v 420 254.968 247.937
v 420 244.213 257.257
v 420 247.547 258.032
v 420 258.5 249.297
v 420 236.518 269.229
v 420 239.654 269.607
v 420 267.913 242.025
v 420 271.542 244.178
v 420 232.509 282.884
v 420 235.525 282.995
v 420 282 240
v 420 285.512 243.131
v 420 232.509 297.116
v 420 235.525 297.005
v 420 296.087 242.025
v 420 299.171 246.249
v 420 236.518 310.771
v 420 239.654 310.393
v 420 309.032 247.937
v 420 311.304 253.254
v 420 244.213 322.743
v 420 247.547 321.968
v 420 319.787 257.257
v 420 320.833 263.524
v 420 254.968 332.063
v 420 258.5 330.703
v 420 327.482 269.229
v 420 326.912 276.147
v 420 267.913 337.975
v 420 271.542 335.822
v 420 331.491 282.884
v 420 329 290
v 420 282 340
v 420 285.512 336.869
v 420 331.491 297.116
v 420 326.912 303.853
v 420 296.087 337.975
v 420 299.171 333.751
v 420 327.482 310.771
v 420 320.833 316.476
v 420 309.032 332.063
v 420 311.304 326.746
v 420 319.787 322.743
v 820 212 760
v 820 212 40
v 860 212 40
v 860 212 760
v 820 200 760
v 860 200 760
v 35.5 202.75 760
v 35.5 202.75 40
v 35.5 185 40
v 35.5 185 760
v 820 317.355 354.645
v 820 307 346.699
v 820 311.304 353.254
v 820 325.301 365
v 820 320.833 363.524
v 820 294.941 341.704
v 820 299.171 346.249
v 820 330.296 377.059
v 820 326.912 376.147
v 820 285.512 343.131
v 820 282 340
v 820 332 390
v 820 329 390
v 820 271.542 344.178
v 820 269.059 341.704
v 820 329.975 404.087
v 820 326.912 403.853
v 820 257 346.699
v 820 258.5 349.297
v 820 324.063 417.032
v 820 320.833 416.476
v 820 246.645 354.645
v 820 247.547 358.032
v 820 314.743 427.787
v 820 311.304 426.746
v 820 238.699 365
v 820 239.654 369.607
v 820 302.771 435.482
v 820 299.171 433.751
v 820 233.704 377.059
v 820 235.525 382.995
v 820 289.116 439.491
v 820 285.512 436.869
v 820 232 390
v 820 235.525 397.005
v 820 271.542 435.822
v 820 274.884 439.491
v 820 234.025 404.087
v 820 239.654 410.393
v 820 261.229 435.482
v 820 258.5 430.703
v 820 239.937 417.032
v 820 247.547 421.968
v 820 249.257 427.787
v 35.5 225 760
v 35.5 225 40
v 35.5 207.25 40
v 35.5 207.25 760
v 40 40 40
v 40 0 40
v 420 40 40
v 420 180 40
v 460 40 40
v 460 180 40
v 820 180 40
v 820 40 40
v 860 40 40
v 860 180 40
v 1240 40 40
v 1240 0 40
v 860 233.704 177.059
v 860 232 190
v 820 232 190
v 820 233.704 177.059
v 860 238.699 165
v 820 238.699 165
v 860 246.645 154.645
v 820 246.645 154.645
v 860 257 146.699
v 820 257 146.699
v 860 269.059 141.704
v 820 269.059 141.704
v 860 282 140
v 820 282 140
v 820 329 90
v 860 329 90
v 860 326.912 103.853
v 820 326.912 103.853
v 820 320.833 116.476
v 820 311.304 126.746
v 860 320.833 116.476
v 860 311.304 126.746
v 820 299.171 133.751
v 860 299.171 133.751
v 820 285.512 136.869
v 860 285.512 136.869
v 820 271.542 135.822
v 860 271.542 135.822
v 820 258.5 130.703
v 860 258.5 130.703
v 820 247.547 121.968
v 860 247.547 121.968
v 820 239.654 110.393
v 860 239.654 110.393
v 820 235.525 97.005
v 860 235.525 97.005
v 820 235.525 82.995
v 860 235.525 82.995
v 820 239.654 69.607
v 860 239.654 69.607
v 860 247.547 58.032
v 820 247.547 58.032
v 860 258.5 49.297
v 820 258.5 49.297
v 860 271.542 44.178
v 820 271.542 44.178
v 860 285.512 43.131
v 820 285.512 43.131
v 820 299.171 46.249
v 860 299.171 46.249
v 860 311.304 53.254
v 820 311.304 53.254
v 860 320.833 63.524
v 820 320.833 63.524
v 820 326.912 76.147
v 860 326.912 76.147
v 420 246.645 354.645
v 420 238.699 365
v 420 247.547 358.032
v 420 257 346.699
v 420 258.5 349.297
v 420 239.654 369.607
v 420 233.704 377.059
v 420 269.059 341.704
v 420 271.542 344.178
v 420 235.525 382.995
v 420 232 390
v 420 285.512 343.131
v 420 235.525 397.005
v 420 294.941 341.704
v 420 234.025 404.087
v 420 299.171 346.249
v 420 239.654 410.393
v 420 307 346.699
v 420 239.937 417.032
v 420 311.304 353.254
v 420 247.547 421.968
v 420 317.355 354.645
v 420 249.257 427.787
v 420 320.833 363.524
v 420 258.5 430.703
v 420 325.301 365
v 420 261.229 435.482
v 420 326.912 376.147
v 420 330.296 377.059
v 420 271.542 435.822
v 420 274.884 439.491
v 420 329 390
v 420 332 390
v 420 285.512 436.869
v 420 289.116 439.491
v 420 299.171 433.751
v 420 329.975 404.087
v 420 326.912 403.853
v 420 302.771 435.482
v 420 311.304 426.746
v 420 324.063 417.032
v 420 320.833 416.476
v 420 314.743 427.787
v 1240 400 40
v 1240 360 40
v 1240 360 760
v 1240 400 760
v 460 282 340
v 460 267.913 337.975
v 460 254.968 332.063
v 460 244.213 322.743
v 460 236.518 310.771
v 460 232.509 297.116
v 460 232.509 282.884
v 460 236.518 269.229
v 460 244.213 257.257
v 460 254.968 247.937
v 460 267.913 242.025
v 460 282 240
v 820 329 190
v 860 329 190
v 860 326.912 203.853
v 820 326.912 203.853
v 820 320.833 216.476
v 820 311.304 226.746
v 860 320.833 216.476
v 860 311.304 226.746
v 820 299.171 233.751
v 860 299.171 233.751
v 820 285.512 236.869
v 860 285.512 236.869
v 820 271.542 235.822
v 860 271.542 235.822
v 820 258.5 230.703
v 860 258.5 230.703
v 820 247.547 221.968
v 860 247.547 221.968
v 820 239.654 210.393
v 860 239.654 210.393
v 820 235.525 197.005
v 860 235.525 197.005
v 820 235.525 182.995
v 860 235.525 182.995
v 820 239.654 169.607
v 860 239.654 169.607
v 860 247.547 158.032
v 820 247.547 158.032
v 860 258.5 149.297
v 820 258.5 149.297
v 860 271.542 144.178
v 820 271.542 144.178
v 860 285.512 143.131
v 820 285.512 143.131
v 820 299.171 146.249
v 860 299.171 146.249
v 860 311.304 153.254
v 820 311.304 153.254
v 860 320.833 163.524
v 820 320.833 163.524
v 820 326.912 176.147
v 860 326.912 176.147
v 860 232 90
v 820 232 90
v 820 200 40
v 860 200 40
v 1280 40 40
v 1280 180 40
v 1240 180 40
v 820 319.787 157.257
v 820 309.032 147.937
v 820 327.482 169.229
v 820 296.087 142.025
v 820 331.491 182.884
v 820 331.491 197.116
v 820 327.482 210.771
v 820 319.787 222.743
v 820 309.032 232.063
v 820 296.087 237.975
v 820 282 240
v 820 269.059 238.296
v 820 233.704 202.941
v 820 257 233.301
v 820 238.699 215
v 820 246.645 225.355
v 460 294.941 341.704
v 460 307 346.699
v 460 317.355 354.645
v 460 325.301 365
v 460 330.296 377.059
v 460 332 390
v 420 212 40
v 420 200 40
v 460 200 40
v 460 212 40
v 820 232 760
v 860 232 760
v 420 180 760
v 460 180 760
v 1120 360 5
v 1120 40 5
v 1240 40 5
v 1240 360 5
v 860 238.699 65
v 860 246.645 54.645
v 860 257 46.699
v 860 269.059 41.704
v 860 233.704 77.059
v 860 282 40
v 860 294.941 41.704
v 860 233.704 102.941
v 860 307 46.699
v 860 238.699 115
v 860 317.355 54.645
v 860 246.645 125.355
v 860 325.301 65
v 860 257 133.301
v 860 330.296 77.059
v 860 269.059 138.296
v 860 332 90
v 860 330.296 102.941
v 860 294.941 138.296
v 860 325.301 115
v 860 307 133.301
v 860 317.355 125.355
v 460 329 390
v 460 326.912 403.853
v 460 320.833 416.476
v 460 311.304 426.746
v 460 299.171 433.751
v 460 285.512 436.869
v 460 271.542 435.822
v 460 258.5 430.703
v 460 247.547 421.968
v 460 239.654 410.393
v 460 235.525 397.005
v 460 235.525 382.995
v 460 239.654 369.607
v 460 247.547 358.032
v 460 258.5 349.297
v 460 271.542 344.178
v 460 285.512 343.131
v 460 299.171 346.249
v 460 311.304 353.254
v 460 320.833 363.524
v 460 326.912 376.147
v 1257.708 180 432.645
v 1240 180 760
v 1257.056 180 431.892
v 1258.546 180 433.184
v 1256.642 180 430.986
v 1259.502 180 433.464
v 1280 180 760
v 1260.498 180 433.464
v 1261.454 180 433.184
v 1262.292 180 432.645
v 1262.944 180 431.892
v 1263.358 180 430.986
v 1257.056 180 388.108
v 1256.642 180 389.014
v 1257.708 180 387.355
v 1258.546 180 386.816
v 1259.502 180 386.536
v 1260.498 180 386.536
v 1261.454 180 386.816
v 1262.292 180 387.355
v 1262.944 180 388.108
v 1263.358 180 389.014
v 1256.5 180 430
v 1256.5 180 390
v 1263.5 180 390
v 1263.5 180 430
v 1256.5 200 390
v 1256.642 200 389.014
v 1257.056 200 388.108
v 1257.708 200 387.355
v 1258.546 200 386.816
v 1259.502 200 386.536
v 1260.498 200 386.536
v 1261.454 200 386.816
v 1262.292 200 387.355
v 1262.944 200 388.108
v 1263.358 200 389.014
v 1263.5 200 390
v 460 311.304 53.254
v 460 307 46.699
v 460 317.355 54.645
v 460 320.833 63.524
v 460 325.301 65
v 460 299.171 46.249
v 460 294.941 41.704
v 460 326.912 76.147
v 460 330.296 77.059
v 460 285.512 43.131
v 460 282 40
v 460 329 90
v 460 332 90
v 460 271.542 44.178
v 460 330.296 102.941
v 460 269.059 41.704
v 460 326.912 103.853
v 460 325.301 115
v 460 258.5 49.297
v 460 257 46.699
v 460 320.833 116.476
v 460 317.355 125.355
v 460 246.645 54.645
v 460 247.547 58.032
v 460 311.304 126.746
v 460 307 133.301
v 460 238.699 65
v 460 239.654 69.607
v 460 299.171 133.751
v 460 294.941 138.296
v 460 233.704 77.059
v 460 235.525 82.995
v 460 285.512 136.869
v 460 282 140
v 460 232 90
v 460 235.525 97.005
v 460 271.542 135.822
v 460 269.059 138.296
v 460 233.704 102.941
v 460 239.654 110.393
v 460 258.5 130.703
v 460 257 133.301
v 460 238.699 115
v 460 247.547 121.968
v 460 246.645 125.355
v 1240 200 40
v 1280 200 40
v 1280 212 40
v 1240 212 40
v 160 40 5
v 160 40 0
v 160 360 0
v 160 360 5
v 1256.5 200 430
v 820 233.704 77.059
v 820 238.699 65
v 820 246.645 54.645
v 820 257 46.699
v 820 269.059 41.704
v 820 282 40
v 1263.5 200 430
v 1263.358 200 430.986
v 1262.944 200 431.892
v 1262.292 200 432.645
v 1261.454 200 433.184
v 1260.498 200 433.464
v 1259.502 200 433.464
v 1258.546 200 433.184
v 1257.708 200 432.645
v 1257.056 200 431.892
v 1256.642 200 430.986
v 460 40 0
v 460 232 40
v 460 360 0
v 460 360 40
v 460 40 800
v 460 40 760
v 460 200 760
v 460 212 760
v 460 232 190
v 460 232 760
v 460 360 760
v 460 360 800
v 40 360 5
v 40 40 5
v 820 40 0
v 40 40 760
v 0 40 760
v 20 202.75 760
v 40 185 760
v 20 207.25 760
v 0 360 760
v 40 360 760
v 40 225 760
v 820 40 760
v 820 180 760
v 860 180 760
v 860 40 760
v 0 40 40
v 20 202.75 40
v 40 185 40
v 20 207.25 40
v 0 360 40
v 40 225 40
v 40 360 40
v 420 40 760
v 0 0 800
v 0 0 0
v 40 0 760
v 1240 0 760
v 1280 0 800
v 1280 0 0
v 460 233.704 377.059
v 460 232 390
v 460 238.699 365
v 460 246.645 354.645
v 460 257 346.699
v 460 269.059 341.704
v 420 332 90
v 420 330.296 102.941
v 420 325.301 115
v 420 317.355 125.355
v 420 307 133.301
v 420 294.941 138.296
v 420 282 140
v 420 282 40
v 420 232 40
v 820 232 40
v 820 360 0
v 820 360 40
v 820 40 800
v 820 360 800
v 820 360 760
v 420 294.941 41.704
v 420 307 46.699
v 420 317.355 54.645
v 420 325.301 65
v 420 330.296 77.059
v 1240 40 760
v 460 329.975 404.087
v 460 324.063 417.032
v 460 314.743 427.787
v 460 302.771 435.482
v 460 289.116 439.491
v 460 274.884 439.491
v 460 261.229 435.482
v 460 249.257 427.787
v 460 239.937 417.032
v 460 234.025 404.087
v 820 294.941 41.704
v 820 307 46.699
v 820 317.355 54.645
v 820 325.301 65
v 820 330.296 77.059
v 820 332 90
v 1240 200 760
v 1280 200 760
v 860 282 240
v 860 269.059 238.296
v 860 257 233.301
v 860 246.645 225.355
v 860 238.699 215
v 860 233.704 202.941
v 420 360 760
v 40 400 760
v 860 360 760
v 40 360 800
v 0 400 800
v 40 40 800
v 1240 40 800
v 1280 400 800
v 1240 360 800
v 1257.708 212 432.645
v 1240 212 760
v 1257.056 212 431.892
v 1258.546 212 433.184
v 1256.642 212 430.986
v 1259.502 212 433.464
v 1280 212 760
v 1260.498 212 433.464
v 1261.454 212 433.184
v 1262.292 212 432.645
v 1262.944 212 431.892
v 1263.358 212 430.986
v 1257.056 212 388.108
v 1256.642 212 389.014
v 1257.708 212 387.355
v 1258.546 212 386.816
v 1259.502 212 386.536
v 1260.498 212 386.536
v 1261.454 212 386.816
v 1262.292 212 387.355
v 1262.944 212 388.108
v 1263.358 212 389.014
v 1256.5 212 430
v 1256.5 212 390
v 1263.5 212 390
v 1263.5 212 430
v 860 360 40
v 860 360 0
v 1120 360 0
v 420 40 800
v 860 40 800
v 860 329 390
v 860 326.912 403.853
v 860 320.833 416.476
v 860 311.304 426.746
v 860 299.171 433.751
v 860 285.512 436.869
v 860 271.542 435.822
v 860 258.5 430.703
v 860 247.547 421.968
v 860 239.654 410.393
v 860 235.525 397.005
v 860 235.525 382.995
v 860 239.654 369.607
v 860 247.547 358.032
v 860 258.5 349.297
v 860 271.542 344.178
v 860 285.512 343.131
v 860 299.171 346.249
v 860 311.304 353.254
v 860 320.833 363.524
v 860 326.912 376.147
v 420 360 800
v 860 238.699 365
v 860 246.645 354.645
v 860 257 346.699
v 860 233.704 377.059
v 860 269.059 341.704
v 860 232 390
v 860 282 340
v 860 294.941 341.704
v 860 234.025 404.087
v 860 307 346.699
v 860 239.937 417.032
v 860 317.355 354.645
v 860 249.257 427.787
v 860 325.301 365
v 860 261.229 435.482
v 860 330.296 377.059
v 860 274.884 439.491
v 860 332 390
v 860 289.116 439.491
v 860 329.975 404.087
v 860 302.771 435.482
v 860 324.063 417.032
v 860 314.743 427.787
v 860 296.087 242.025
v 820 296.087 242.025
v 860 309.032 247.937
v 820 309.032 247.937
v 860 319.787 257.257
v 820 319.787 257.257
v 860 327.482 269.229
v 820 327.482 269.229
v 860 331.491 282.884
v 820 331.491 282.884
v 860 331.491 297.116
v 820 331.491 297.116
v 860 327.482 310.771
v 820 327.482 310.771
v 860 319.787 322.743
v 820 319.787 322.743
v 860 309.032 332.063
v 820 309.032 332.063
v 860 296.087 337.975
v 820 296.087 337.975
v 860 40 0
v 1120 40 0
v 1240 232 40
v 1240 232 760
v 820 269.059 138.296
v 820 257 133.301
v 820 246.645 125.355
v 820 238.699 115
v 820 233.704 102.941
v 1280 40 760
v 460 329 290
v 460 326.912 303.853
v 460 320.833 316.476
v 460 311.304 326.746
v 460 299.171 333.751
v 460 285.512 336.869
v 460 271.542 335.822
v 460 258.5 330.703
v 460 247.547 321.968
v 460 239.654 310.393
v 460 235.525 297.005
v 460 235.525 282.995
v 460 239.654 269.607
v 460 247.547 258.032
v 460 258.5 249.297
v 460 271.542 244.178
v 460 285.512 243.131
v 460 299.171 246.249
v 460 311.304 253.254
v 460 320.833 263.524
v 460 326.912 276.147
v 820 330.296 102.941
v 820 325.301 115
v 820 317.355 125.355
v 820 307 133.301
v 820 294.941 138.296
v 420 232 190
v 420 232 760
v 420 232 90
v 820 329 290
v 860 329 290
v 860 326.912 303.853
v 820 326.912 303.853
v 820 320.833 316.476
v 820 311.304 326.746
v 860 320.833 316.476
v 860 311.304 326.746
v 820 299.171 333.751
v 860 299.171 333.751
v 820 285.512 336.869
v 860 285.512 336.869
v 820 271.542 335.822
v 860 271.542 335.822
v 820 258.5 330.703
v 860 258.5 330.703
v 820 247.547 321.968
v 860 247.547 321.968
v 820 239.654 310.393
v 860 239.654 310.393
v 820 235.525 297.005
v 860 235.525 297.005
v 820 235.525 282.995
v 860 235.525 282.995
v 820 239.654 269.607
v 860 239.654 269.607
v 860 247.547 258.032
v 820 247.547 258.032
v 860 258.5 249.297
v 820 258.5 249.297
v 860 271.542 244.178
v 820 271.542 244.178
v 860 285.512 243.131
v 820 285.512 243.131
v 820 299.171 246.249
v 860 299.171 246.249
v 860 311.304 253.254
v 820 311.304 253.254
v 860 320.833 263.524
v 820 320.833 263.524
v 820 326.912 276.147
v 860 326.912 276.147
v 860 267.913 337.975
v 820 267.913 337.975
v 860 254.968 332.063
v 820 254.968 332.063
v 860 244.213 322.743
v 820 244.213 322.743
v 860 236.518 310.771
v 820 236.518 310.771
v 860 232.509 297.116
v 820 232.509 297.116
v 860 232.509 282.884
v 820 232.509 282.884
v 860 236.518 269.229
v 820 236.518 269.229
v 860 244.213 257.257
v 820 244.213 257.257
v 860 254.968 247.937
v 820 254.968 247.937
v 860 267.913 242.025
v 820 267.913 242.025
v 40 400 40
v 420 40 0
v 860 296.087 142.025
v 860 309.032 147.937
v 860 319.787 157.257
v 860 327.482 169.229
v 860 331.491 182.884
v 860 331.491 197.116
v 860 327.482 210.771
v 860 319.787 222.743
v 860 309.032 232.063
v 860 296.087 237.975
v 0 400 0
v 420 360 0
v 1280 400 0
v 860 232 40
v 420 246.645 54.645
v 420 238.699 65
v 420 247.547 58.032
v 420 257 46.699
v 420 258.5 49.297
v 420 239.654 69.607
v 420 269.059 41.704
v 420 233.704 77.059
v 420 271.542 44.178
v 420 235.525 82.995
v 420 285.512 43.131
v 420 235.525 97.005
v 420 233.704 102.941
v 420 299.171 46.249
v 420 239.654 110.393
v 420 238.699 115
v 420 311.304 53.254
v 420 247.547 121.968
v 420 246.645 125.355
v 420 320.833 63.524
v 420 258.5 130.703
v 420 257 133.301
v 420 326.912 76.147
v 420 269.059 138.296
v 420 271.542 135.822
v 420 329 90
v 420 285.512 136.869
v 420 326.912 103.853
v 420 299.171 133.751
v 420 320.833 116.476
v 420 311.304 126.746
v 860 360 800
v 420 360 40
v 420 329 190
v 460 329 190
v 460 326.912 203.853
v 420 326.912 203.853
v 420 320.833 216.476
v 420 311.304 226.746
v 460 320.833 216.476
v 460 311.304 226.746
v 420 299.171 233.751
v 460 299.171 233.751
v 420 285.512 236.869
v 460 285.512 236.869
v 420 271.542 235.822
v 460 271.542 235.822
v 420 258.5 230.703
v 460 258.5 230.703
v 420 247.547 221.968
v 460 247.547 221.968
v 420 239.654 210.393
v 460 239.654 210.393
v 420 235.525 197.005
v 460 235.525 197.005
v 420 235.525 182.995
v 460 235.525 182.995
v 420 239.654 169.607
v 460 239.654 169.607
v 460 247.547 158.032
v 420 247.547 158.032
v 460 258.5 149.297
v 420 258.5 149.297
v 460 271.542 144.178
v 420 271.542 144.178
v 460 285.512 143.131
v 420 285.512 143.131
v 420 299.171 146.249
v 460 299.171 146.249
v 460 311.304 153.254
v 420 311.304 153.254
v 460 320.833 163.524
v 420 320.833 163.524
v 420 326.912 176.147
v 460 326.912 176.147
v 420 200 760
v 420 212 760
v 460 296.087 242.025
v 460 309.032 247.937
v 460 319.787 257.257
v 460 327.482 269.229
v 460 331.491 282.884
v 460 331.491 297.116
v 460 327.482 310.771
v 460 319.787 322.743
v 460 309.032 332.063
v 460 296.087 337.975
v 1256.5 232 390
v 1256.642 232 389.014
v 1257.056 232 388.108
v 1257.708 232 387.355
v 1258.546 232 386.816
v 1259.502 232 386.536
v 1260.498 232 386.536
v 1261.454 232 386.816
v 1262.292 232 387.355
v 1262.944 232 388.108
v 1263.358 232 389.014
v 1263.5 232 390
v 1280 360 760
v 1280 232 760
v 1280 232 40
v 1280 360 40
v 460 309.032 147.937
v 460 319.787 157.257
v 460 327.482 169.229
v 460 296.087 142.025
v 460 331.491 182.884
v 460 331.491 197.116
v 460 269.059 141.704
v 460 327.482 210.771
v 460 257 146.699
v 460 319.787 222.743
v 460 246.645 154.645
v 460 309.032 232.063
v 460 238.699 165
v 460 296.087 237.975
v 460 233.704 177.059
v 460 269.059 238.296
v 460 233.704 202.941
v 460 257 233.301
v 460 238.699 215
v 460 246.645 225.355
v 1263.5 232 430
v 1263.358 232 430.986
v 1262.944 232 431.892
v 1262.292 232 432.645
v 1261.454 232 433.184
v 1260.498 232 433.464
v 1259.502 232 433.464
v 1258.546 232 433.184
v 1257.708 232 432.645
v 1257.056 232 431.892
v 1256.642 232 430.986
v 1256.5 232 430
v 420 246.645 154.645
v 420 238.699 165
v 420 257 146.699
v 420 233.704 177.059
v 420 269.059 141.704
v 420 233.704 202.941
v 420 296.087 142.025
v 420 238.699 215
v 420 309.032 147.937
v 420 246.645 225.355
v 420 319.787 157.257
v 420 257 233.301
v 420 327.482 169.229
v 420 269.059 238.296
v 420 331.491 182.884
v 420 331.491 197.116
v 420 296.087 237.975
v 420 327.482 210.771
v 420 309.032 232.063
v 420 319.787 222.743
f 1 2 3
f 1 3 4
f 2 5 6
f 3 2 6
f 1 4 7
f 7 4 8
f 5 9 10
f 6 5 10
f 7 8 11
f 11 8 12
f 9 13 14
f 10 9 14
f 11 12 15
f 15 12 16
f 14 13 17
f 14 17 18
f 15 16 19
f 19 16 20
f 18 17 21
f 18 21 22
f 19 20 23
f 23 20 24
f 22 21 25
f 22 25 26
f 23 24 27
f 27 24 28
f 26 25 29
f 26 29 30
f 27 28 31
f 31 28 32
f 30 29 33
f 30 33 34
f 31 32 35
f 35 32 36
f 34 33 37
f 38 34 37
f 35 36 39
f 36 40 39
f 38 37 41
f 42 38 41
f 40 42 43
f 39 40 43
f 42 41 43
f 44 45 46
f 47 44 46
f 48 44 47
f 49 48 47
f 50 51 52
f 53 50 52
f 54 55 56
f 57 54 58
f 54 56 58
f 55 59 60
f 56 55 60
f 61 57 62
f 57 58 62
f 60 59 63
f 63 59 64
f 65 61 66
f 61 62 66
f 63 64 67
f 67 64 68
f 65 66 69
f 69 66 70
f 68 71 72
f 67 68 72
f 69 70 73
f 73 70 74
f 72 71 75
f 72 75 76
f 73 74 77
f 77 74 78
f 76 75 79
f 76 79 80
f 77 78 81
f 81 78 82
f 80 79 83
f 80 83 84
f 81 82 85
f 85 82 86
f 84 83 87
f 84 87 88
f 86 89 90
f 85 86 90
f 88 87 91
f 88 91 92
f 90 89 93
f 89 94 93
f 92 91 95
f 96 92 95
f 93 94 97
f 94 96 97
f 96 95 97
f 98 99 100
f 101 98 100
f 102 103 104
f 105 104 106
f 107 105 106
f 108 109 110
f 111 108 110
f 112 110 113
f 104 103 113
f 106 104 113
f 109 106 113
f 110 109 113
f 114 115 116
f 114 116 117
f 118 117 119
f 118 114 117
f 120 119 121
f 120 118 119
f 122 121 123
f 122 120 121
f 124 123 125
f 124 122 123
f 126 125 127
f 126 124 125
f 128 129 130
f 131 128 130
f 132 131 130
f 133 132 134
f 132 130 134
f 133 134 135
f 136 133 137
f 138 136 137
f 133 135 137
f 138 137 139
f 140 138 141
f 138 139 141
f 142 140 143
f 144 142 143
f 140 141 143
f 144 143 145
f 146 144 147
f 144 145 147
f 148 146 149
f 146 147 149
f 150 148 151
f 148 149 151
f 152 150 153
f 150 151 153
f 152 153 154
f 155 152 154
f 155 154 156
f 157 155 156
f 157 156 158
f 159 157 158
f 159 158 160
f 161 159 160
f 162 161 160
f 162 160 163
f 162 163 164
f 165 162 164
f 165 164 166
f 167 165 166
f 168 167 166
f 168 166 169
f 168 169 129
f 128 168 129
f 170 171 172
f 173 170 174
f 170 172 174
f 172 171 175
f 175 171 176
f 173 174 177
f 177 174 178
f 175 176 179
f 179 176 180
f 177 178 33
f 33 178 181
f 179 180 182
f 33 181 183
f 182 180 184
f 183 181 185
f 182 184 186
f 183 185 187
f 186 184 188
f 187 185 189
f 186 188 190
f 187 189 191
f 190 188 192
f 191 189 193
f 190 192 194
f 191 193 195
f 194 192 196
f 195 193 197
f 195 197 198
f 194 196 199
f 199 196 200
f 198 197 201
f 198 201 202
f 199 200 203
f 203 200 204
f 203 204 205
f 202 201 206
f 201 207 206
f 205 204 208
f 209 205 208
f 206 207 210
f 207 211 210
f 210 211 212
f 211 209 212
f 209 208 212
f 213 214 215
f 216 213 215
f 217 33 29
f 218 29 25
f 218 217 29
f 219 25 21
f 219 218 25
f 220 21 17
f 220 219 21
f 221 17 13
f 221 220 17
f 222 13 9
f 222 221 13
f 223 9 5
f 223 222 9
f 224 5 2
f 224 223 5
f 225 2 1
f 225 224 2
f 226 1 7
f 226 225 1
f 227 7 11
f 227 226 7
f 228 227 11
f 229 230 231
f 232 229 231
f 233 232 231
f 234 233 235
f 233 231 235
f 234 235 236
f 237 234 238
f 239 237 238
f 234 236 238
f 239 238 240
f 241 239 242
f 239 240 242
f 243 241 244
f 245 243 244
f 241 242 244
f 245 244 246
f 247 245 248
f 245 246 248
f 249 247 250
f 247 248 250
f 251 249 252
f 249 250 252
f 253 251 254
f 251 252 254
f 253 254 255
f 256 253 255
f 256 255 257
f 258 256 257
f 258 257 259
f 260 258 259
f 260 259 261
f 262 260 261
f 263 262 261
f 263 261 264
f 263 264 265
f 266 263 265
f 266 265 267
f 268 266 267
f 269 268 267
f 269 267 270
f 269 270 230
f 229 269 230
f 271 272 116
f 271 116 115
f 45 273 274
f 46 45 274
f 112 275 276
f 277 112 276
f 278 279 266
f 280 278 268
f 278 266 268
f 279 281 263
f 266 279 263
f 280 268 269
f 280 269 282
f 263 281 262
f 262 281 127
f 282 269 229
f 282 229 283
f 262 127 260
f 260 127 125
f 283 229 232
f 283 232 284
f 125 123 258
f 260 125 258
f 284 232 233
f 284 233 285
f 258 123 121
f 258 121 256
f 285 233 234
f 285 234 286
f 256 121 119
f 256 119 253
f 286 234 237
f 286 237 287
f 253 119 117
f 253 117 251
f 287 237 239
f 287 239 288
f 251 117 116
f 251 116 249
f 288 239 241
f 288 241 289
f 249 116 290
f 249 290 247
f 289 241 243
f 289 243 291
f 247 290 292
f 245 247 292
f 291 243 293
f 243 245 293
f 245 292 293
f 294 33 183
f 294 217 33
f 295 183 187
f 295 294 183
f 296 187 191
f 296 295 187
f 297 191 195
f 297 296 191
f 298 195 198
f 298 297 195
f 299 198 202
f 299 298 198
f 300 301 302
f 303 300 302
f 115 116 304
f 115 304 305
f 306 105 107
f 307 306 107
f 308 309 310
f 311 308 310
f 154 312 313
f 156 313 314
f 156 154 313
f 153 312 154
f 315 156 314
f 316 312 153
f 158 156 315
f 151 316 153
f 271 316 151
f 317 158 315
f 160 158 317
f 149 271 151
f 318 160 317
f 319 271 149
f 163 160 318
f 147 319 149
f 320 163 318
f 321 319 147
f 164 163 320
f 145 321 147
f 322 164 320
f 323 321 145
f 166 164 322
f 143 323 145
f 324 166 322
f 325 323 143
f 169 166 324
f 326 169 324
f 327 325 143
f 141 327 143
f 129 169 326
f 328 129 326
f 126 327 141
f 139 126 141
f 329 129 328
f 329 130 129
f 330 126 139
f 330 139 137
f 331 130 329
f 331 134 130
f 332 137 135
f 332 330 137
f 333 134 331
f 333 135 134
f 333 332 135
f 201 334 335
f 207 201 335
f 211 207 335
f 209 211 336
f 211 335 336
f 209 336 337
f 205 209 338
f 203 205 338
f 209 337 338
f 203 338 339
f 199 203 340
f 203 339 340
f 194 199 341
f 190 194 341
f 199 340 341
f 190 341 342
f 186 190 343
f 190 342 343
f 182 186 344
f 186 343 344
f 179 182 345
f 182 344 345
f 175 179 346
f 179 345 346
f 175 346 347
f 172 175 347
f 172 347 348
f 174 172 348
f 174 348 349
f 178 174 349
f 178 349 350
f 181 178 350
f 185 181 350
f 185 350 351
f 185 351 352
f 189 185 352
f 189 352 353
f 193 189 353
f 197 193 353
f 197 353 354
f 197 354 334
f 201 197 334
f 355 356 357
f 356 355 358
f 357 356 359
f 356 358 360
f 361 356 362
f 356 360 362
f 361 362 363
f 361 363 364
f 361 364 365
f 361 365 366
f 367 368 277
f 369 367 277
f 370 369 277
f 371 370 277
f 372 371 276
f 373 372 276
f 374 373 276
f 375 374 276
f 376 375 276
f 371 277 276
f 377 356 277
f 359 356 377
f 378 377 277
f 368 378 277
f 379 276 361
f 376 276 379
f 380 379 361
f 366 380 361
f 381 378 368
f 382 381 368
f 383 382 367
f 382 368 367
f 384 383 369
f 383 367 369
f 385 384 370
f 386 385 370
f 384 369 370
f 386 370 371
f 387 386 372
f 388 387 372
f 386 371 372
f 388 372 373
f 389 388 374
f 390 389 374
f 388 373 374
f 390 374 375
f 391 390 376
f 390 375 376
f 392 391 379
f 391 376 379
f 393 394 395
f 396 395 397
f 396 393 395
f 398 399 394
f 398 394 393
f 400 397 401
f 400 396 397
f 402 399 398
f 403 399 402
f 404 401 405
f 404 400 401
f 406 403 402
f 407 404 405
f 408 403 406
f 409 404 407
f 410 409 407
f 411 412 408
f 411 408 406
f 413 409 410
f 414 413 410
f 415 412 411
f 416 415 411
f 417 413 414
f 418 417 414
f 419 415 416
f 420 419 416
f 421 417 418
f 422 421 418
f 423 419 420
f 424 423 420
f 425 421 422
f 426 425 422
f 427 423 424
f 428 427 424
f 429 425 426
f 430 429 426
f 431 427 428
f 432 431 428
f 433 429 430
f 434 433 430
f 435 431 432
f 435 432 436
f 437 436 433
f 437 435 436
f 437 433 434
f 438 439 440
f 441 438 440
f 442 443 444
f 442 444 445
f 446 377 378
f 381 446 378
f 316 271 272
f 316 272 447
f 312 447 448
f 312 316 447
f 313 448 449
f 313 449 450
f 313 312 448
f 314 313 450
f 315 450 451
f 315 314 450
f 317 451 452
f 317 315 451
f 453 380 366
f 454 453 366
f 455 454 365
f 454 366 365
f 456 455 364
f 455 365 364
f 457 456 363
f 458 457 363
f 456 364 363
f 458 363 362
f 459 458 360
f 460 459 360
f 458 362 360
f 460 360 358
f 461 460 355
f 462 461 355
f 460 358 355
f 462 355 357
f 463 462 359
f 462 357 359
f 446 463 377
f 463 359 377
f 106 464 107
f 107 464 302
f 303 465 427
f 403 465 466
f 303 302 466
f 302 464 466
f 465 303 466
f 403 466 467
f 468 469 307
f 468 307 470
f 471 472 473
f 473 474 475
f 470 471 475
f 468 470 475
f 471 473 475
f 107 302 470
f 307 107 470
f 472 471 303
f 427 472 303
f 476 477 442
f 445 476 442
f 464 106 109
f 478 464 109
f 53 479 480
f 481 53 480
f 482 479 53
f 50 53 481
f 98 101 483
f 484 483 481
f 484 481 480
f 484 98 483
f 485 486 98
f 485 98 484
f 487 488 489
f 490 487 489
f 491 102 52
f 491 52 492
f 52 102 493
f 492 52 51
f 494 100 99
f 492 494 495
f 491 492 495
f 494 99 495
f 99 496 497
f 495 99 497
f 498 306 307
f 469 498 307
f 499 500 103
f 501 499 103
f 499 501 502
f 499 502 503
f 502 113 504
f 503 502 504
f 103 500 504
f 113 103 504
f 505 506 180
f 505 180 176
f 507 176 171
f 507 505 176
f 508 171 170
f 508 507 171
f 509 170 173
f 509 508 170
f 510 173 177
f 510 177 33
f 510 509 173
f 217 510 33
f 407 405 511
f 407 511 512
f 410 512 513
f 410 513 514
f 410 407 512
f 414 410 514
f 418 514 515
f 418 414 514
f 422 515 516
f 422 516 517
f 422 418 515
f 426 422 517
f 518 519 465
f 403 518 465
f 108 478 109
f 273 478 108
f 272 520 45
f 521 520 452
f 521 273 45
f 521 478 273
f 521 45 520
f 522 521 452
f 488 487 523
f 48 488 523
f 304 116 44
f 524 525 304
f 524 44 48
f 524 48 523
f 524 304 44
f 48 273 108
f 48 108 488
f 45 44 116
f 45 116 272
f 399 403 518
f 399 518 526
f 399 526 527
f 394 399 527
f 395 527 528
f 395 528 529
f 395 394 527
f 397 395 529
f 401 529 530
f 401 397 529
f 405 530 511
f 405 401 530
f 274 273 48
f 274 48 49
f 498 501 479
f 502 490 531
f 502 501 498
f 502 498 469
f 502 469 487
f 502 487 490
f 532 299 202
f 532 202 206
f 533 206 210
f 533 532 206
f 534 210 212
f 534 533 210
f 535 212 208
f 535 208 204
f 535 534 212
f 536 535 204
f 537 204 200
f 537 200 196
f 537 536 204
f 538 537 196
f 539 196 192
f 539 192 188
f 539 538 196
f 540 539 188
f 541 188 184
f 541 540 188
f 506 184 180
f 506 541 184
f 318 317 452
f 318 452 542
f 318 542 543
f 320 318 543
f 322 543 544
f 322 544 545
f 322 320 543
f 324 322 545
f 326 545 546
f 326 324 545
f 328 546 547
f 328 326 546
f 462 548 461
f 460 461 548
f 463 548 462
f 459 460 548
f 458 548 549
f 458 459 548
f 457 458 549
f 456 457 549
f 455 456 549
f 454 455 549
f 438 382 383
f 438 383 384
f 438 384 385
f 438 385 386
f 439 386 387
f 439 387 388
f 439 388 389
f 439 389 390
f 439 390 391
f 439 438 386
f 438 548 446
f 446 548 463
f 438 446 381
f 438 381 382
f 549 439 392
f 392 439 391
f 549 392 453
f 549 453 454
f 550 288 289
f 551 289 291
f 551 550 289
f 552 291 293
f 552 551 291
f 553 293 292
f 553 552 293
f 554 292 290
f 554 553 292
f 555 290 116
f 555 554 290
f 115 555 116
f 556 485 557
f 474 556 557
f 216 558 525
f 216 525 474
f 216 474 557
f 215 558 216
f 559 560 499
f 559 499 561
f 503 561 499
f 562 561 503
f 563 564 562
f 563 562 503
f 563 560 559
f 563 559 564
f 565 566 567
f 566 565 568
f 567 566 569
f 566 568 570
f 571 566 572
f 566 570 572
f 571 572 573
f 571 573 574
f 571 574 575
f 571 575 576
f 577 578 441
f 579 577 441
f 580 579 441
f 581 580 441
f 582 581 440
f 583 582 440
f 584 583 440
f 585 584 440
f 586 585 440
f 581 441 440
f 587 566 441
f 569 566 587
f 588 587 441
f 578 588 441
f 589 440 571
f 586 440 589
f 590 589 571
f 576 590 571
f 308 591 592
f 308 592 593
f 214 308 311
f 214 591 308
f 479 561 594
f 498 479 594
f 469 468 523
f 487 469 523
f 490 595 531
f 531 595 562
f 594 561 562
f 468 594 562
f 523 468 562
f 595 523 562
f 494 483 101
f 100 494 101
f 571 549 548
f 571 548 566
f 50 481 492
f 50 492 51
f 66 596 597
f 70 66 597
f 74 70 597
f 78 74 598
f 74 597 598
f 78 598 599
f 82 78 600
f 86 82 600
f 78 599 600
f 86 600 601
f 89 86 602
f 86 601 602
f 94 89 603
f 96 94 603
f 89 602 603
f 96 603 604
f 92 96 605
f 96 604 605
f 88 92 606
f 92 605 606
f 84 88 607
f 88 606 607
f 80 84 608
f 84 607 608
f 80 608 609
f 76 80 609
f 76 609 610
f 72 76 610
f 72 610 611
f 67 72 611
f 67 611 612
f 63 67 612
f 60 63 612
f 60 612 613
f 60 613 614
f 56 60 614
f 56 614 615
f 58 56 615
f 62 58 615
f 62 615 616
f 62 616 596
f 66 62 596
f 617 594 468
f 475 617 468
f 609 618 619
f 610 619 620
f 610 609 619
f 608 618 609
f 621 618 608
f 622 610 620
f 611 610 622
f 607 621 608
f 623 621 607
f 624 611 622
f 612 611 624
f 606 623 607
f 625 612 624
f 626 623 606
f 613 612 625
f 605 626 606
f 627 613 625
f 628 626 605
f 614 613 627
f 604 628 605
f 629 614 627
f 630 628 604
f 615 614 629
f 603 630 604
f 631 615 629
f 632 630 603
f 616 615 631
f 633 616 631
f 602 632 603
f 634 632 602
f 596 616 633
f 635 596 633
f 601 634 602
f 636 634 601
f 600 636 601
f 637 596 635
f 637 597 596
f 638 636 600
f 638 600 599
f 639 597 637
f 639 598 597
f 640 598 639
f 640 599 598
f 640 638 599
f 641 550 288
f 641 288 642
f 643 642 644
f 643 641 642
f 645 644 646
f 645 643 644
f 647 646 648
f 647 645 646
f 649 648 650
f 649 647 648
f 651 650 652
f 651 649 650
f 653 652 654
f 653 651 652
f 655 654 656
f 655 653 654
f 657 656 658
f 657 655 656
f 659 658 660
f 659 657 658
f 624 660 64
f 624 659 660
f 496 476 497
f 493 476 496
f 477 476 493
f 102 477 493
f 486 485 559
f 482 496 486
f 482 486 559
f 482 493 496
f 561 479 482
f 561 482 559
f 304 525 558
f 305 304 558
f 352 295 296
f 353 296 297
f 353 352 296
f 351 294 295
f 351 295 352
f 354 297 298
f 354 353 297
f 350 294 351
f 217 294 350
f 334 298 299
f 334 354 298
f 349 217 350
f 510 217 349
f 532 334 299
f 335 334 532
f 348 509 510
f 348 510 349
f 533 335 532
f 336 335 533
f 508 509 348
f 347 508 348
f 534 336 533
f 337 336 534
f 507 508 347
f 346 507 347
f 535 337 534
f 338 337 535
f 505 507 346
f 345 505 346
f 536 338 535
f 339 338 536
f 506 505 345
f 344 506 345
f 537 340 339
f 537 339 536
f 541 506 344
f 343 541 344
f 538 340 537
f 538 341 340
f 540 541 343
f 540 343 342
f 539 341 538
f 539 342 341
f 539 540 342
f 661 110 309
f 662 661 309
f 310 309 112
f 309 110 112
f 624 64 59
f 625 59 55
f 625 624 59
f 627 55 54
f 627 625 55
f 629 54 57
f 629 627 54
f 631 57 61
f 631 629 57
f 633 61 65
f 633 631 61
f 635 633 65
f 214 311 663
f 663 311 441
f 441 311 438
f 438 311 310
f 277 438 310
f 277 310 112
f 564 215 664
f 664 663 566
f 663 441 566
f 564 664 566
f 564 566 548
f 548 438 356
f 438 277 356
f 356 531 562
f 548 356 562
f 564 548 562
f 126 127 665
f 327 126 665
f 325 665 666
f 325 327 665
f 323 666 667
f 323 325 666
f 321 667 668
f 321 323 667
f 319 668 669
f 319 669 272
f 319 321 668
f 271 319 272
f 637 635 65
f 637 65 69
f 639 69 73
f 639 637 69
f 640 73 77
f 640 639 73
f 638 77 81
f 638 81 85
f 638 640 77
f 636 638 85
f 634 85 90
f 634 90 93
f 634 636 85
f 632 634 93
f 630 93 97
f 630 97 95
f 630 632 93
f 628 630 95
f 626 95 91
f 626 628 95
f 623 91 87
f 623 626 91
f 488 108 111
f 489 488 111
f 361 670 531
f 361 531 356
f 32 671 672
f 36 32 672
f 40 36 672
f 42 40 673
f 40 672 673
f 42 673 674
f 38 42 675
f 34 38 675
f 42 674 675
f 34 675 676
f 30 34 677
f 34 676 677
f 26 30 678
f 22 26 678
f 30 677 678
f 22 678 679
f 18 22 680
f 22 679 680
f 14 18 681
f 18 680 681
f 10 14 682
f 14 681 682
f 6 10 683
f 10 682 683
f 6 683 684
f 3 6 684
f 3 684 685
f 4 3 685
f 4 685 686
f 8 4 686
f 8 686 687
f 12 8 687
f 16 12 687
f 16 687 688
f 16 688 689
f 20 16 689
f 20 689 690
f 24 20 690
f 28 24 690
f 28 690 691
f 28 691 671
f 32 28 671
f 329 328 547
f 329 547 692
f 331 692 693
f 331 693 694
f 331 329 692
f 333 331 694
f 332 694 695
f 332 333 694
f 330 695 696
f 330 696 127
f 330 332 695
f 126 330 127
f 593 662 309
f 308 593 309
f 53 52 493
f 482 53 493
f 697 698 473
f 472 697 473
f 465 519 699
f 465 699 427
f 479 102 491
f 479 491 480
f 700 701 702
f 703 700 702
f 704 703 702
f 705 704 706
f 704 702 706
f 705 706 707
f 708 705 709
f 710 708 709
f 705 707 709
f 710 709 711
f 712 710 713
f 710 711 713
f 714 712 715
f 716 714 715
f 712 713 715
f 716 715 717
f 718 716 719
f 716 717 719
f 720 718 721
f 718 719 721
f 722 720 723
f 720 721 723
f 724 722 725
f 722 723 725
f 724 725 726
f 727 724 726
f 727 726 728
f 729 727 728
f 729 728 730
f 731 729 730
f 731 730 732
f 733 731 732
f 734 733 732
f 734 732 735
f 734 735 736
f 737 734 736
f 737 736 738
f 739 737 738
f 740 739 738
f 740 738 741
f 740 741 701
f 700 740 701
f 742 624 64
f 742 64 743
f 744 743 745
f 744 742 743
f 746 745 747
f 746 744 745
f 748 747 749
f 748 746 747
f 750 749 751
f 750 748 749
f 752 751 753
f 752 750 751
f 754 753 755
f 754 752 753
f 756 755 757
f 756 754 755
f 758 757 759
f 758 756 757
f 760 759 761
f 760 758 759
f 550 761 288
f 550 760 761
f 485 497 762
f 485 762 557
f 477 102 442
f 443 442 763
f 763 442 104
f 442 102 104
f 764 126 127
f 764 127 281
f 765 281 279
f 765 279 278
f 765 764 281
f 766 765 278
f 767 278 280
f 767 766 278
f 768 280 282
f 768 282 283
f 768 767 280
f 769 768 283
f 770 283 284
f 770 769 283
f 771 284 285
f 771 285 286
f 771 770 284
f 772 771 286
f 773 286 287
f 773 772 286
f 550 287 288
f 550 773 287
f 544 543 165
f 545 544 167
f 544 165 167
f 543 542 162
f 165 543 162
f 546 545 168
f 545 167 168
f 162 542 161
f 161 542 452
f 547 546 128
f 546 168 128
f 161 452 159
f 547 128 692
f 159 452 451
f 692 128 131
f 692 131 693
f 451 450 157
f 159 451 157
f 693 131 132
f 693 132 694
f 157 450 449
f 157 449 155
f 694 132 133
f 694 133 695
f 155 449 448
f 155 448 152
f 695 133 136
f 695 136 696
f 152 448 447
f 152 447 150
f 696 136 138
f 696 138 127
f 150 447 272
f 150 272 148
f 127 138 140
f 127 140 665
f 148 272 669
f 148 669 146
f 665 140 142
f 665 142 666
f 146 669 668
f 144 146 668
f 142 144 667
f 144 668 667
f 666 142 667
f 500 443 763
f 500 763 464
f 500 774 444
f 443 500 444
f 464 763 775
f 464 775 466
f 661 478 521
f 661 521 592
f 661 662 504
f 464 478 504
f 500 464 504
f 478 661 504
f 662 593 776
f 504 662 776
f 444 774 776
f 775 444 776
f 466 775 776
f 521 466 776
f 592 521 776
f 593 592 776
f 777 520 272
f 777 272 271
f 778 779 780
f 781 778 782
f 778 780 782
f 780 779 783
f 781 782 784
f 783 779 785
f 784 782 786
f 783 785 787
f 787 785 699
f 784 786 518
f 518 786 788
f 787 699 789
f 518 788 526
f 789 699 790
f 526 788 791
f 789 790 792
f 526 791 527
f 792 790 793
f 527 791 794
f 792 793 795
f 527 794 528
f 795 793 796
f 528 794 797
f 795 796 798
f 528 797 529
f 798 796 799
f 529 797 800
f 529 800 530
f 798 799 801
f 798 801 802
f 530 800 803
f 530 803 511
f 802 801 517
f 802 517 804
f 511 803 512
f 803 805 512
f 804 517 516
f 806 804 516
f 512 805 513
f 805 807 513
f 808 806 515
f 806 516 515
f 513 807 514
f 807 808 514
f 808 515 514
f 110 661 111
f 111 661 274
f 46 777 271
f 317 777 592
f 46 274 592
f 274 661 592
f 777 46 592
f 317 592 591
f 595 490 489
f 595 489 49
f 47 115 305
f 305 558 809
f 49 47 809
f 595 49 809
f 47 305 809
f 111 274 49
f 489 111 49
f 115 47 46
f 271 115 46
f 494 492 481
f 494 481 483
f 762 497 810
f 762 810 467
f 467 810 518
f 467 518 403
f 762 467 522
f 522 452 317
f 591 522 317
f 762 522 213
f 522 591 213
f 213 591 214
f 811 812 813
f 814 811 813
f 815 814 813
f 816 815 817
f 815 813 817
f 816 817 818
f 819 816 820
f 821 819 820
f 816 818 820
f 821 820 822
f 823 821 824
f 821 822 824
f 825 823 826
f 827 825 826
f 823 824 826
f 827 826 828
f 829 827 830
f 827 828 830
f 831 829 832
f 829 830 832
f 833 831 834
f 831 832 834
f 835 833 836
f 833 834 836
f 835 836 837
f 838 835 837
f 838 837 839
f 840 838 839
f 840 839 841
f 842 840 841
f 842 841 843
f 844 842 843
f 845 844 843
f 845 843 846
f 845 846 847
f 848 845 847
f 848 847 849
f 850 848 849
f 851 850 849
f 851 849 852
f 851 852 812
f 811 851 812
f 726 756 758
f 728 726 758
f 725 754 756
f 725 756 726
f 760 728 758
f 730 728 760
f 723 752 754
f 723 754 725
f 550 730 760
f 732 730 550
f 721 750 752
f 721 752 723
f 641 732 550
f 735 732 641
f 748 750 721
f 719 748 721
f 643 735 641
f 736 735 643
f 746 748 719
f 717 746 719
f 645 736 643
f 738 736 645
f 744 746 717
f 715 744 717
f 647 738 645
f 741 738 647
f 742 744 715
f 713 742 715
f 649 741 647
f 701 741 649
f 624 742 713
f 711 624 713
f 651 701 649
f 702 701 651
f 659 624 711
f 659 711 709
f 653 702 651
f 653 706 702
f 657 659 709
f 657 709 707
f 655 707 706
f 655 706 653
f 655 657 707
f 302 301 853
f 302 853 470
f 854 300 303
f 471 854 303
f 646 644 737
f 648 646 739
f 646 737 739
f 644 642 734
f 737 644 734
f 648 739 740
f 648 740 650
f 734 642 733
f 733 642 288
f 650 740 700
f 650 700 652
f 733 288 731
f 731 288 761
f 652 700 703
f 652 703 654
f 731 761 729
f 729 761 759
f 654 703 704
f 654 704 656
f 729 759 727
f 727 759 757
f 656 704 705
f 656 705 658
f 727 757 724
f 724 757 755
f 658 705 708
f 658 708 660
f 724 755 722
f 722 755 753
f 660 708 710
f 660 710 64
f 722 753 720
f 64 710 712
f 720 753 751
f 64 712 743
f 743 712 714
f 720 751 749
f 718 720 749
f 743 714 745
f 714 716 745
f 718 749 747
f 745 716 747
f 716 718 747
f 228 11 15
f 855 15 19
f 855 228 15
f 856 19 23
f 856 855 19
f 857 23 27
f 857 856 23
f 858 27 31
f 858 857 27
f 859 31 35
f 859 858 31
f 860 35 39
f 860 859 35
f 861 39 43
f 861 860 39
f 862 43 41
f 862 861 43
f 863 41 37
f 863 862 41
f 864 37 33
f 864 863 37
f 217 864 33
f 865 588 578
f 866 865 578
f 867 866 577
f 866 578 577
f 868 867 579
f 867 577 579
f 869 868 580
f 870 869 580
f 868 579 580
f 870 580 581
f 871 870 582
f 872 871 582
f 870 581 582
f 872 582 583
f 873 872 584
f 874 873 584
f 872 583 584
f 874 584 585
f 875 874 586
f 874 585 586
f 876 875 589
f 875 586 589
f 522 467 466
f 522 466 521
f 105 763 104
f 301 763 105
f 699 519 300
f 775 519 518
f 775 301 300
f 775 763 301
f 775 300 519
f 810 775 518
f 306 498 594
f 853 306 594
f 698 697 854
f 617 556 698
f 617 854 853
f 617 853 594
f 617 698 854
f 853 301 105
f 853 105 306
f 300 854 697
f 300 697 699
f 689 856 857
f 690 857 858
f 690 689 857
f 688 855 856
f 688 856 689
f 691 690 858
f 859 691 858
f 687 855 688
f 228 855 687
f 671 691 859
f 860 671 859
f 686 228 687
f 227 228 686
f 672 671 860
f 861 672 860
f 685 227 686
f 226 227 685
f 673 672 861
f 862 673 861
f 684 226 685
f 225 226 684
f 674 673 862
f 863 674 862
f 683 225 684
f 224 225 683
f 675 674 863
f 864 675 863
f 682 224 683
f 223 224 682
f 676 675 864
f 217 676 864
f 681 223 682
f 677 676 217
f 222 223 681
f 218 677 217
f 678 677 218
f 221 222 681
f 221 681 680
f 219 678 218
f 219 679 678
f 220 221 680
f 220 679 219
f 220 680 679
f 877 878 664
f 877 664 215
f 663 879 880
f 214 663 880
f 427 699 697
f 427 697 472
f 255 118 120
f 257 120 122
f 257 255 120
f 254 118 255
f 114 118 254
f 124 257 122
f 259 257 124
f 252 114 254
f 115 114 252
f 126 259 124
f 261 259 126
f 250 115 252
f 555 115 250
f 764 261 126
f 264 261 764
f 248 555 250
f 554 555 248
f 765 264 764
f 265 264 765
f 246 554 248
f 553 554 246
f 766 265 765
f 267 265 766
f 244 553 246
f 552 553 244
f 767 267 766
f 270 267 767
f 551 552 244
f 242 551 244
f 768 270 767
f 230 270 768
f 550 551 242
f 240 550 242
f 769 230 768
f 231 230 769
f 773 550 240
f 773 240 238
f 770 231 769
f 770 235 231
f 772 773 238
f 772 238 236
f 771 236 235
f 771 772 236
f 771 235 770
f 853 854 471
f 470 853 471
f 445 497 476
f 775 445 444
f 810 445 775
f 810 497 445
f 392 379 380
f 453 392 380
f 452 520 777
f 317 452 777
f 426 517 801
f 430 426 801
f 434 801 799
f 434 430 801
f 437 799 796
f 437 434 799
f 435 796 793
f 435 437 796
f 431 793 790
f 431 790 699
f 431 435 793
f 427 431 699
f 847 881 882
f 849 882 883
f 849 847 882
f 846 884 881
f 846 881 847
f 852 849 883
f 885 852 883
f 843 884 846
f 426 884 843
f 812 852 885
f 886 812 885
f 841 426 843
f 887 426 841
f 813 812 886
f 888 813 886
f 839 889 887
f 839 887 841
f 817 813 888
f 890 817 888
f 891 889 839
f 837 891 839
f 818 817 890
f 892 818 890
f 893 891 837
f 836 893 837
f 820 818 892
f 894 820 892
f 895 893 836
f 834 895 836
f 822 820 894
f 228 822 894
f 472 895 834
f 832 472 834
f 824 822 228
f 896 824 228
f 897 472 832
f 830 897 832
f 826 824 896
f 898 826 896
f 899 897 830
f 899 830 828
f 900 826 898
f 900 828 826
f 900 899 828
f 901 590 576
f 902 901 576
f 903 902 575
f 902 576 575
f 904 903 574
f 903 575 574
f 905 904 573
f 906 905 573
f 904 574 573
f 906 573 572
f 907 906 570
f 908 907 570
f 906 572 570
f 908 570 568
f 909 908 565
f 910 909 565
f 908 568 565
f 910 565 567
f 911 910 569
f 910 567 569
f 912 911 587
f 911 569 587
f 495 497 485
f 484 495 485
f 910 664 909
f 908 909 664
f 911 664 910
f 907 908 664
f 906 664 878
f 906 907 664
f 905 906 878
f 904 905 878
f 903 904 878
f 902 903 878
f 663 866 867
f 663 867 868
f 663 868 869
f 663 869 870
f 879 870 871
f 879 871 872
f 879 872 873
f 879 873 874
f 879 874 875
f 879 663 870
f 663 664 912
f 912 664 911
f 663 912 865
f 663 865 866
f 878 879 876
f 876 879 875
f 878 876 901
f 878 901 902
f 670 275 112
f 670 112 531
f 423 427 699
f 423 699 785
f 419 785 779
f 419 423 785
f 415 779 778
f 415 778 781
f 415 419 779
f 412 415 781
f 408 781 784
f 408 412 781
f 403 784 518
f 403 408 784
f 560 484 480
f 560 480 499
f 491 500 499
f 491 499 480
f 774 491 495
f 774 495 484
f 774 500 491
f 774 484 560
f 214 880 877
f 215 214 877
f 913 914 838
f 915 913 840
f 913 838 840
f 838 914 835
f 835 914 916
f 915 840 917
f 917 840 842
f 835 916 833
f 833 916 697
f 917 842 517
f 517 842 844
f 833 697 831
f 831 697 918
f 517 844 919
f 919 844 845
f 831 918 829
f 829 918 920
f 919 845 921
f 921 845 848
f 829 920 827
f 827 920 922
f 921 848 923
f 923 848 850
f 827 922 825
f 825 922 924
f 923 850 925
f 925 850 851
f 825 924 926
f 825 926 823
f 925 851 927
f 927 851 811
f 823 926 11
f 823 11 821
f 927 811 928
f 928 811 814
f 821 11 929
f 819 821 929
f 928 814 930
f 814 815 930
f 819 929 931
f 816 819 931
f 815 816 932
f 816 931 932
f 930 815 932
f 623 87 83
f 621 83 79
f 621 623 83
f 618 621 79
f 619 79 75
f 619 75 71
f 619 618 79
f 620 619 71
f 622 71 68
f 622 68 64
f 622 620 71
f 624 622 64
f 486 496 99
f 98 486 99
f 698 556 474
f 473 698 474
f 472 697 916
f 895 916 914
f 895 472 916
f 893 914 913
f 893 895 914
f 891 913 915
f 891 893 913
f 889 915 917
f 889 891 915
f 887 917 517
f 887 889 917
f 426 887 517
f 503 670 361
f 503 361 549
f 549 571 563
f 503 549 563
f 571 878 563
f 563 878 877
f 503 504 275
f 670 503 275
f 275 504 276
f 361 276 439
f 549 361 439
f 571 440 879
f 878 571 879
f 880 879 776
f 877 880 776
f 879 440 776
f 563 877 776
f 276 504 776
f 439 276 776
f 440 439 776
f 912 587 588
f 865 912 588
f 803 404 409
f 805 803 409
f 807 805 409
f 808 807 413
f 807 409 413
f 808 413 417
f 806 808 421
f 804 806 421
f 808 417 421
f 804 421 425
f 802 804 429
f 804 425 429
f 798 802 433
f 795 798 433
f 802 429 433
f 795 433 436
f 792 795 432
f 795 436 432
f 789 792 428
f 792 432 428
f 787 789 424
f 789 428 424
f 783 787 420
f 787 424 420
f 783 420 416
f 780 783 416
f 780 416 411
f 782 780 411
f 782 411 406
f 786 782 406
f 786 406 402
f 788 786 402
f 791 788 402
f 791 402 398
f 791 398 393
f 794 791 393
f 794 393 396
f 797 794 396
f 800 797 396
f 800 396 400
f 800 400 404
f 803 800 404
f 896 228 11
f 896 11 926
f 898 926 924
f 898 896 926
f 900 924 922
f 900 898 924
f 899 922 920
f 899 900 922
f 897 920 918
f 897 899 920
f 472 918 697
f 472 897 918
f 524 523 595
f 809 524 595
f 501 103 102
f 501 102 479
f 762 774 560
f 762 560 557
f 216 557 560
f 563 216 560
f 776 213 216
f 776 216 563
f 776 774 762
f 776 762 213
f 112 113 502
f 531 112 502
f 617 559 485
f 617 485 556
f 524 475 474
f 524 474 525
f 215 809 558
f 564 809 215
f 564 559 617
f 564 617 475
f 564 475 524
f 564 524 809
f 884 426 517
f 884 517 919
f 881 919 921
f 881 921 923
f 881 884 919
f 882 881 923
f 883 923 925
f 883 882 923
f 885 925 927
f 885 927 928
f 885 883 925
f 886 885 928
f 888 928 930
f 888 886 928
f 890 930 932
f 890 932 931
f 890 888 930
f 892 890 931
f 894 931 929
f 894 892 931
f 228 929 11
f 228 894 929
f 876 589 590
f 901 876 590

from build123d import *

# Parameters (mm, degrees)
F0_W      = 1280
F0_H      = 400
F1_DEPTH  = 800
F2_W      = 1200
F2_H      = 320
F3_DEPTH  = 800.001
F4_W      = 1200
F4_H      = 720
F5_DEPTH  = 400.001
F6_W      = 320
F6_H      = 720
F7_DEPTH  = 1280.001
F8_W      = 40
F8_H      = 40
F9_DEPTH  = 320
F10_W     = 40
F10_H     = 40
F11_DEPTH = 320
F12_W     = 40
F12_H     = 20
F12_W_2   = 15.5
F12_H_2   = 4.5
F14_R     = 47
F15_DEPTH = 440
F16_W     = 360
F16_H     = 430
F17_DEPTH = 220.001
F18_W     = 120
F18_H     = 5
F19_DEPTH = 320
F20_W     = 40
F20_H     = 20
F21_DEPTH = 720
F23_DEPTH = 52


with BuildPart() as f1:
    # F0 (on Top) → F1 (new body)
    with BuildSketch(Plane.XY):
        with Locations((640, 200)):
            Rectangle(F0_W, F0_H)
    extrude(amount=F1_DEPTH)

    # F2 (on face) → F3 (cut, through all)
    with BuildSketch(Plane.XY.offset(800)):
        with Locations((640, 200)):
            Rectangle(F2_W, F2_H)
    extrude(amount=-F3_DEPTH, mode=Mode.SUBTRACT)

    # F4 (on face) → F5 (cut, through all)
    with BuildSketch(Plane.XZ):
        with Locations((640, 400)):
            Rectangle(F4_W, F4_H)
    extrude(amount=-F5_DEPTH, mode=Mode.SUBTRACT)

    # F6 (on face) → F7 (cut, through all)
    with BuildSketch(Plane.YZ.offset(1280)):
        with Locations((200, 400)):
            Rectangle(F6_W, F6_H)
    extrude(amount=-F7_DEPTH, mode=Mode.SUBTRACT)

    # F8 (on face) → F9 (join, through all)
    with BuildSketch(Plane.XZ.offset(-360)):
        with Locations((440, 20)):
            Rectangle(F8_W, F8_H)
        with Locations((840, 20)):
            Rectangle(F8_W, F8_H)
    extrude(amount=F9_DEPTH)

    # F10 (on face) → F11 (join, through all)
    with BuildSketch(Plane.XZ.offset(-360)):
        with Locations((440, 779.9999904633)):
            Rectangle(F10_W, F10_H)
        with Locations((840, 779.9999904633)):
            Rectangle(F10_W, F10_H)
    extrude(amount=F11_DEPTH)

    # F12 (on face) → F13 (join, up to the next surface of F1)
    with BuildSketch(Plane.XY.offset(40)):
        with Locations((440, 190)):
            Rectangle(F12_W, F12_H)
        with Locations((840, 222)):
            Rectangle(F12_W, F12_H)
        with Locations((840, 190)):
            Rectangle(F12_W, F12_H)
        with Locations((440, 222)):
            Rectangle(F12_W, F12_H)
        with Locations((27.75, 205)):
            Rectangle(F12_W_2, F12_H_2)
        Polygon((40, 185), (40, 225), (35.5, 225), (35.5, 207.25), (35.5, 202.75), (35.5, 185), align=None)
    extrude(until=Until.NEXT)



with BuildPart() as f15:
    # F14 (on face) → F15 (new body)
    with BuildSketch(Plane.YZ.offset(860)):
        with BuildLine():
            ThreePointArc((232.0000026226, 390), (246.6446635633, 354.6446609407), (282.0000026227, 340))
            ThreePointArc((282.0000026227, 340), (317.355341682, 354.6446609407), (332.0000026226, 390))
            ThreePointArc((332.0000026226, 390), (282.0000026226, 440), (232.0000026226, 390))
        make_face()
        with Locations((282.0000026226, 390)):
            Circle(F14_R, mode=Mode.SUBTRACT)
    extrude(amount=-F15_DEPTH)

    # F14 (on face) → F15, piece 2 (join)
    with BuildSketch(Plane.YZ.offset(860)):
        with BuildLine():
            ThreePointArc((232.0000026226, 290), (246.6446630019, 254.6446615021), (282.0000010347, 240))
            ThreePointArc((282.0000010347, 240), (317.3553411205, 254.6446603792), (332.0000026226, 290))
            ThreePointArc((332.0000026226, 290), (317.355341682, 325.3553390593), (282.0000026227, 340))
            ThreePointArc((282.0000026227, 340), (246.6446635633, 325.3553390593), (232.0000026226, 290))
        make_face()
        with Locations((282.0000026226, 290)):
            Circle(F14_R, mode=Mode.SUBTRACT)
    extrude(amount=-F15_DEPTH)


with BuildPart() as f1_1:
    add(f1.part)

    add(f15.part)  # F15#3 merges F15
    # F14 (on face) → F15, piece 3 (join)
    with BuildSketch(Plane.YZ.offset(860)):
        with BuildLine():
            ThreePointArc((232, 189.9999997472), (246.6446610932, 154.6446607881), (282.0000001788, 140))
            ThreePointArc((282.0000001788, 140), (317.3553391225, 154.6446610039), (332, 190))
            ThreePointArc((332, 190), (317.3553394251, 225.3553386935), (282.0000010347, 240))
            ThreePointArc((282.0000010347, 240), (246.6446612171, 225.3553393358), (232, 189.9999997472))
        make_face()
        with Locations((282, 190)):
            Circle(F14_R, mode=Mode.SUBTRACT)
        with BuildLine():
            ThreePointArc((282, 40), (317.3553390593, 54.6446609407), (332, 90))
            ThreePointArc((332, 90), (317.3553391225, 125.3553389961), (282.0000001788, 140))
            ThreePointArc((282.0000001788, 140), (246.6446610039, 125.3553391225), (232, 90))
            ThreePointArc((232, 90), (246.6446609407, 54.6446609407), (282, 40))
        make_face()
        with Locations((282, 90)):
            Circle(F14_R, mode=Mode.SUBTRACT)
    extrude(amount=-F15_DEPTH)

    # F16 (on face) → F17 (cut, through all)
    with BuildSketch(Plane.XZ.offset(-180)):
        with Locations((640, 255)):
            Rectangle(F16_W, F16_H)
    extrude(amount=-F17_DEPTH, mode=Mode.SUBTRACT)

    # F18 (on face) → F19 (join, through all)
    with BuildSketch(Plane.XZ.offset(-360)):
        with Locations((100, 2.5)):
            Rectangle(F18_W, F18_H)
        with Locations((1180, 2.5)):
            Rectangle(F18_W, F18_H)
    extrude(amount=F19_DEPTH)

    # F20 (on face) → F21 (join, through all)
    with BuildSketch(Plane.XY.offset(40)):
        with Locations((1260, 190)):
            Rectangle(F20_W, F20_H)
        with Locations((1260, 222)):
            Rectangle(F20_W, F20_H)
    extrude(amount=F21_DEPTH)

    # F22 (on face) → F23 (cut, through all)
    with BuildSketch(Plane.XZ.offset(-180)):
        with BuildLine():
            Line((1256.5, 430), (1256.5, 390))
            ThreePointArc((1256.5, 390), (1260, 386.5), (1263.5, 390))
            Line((1263.5, 390), (1263.5, 430))
            ThreePointArc((1263.5, 430), (1260, 433.5), (1256.5, 430))
        make_face()
    extrude(amount=-F23_DEPTH, mode=Mode.SUBTRACT)


solid = f1_1.part
